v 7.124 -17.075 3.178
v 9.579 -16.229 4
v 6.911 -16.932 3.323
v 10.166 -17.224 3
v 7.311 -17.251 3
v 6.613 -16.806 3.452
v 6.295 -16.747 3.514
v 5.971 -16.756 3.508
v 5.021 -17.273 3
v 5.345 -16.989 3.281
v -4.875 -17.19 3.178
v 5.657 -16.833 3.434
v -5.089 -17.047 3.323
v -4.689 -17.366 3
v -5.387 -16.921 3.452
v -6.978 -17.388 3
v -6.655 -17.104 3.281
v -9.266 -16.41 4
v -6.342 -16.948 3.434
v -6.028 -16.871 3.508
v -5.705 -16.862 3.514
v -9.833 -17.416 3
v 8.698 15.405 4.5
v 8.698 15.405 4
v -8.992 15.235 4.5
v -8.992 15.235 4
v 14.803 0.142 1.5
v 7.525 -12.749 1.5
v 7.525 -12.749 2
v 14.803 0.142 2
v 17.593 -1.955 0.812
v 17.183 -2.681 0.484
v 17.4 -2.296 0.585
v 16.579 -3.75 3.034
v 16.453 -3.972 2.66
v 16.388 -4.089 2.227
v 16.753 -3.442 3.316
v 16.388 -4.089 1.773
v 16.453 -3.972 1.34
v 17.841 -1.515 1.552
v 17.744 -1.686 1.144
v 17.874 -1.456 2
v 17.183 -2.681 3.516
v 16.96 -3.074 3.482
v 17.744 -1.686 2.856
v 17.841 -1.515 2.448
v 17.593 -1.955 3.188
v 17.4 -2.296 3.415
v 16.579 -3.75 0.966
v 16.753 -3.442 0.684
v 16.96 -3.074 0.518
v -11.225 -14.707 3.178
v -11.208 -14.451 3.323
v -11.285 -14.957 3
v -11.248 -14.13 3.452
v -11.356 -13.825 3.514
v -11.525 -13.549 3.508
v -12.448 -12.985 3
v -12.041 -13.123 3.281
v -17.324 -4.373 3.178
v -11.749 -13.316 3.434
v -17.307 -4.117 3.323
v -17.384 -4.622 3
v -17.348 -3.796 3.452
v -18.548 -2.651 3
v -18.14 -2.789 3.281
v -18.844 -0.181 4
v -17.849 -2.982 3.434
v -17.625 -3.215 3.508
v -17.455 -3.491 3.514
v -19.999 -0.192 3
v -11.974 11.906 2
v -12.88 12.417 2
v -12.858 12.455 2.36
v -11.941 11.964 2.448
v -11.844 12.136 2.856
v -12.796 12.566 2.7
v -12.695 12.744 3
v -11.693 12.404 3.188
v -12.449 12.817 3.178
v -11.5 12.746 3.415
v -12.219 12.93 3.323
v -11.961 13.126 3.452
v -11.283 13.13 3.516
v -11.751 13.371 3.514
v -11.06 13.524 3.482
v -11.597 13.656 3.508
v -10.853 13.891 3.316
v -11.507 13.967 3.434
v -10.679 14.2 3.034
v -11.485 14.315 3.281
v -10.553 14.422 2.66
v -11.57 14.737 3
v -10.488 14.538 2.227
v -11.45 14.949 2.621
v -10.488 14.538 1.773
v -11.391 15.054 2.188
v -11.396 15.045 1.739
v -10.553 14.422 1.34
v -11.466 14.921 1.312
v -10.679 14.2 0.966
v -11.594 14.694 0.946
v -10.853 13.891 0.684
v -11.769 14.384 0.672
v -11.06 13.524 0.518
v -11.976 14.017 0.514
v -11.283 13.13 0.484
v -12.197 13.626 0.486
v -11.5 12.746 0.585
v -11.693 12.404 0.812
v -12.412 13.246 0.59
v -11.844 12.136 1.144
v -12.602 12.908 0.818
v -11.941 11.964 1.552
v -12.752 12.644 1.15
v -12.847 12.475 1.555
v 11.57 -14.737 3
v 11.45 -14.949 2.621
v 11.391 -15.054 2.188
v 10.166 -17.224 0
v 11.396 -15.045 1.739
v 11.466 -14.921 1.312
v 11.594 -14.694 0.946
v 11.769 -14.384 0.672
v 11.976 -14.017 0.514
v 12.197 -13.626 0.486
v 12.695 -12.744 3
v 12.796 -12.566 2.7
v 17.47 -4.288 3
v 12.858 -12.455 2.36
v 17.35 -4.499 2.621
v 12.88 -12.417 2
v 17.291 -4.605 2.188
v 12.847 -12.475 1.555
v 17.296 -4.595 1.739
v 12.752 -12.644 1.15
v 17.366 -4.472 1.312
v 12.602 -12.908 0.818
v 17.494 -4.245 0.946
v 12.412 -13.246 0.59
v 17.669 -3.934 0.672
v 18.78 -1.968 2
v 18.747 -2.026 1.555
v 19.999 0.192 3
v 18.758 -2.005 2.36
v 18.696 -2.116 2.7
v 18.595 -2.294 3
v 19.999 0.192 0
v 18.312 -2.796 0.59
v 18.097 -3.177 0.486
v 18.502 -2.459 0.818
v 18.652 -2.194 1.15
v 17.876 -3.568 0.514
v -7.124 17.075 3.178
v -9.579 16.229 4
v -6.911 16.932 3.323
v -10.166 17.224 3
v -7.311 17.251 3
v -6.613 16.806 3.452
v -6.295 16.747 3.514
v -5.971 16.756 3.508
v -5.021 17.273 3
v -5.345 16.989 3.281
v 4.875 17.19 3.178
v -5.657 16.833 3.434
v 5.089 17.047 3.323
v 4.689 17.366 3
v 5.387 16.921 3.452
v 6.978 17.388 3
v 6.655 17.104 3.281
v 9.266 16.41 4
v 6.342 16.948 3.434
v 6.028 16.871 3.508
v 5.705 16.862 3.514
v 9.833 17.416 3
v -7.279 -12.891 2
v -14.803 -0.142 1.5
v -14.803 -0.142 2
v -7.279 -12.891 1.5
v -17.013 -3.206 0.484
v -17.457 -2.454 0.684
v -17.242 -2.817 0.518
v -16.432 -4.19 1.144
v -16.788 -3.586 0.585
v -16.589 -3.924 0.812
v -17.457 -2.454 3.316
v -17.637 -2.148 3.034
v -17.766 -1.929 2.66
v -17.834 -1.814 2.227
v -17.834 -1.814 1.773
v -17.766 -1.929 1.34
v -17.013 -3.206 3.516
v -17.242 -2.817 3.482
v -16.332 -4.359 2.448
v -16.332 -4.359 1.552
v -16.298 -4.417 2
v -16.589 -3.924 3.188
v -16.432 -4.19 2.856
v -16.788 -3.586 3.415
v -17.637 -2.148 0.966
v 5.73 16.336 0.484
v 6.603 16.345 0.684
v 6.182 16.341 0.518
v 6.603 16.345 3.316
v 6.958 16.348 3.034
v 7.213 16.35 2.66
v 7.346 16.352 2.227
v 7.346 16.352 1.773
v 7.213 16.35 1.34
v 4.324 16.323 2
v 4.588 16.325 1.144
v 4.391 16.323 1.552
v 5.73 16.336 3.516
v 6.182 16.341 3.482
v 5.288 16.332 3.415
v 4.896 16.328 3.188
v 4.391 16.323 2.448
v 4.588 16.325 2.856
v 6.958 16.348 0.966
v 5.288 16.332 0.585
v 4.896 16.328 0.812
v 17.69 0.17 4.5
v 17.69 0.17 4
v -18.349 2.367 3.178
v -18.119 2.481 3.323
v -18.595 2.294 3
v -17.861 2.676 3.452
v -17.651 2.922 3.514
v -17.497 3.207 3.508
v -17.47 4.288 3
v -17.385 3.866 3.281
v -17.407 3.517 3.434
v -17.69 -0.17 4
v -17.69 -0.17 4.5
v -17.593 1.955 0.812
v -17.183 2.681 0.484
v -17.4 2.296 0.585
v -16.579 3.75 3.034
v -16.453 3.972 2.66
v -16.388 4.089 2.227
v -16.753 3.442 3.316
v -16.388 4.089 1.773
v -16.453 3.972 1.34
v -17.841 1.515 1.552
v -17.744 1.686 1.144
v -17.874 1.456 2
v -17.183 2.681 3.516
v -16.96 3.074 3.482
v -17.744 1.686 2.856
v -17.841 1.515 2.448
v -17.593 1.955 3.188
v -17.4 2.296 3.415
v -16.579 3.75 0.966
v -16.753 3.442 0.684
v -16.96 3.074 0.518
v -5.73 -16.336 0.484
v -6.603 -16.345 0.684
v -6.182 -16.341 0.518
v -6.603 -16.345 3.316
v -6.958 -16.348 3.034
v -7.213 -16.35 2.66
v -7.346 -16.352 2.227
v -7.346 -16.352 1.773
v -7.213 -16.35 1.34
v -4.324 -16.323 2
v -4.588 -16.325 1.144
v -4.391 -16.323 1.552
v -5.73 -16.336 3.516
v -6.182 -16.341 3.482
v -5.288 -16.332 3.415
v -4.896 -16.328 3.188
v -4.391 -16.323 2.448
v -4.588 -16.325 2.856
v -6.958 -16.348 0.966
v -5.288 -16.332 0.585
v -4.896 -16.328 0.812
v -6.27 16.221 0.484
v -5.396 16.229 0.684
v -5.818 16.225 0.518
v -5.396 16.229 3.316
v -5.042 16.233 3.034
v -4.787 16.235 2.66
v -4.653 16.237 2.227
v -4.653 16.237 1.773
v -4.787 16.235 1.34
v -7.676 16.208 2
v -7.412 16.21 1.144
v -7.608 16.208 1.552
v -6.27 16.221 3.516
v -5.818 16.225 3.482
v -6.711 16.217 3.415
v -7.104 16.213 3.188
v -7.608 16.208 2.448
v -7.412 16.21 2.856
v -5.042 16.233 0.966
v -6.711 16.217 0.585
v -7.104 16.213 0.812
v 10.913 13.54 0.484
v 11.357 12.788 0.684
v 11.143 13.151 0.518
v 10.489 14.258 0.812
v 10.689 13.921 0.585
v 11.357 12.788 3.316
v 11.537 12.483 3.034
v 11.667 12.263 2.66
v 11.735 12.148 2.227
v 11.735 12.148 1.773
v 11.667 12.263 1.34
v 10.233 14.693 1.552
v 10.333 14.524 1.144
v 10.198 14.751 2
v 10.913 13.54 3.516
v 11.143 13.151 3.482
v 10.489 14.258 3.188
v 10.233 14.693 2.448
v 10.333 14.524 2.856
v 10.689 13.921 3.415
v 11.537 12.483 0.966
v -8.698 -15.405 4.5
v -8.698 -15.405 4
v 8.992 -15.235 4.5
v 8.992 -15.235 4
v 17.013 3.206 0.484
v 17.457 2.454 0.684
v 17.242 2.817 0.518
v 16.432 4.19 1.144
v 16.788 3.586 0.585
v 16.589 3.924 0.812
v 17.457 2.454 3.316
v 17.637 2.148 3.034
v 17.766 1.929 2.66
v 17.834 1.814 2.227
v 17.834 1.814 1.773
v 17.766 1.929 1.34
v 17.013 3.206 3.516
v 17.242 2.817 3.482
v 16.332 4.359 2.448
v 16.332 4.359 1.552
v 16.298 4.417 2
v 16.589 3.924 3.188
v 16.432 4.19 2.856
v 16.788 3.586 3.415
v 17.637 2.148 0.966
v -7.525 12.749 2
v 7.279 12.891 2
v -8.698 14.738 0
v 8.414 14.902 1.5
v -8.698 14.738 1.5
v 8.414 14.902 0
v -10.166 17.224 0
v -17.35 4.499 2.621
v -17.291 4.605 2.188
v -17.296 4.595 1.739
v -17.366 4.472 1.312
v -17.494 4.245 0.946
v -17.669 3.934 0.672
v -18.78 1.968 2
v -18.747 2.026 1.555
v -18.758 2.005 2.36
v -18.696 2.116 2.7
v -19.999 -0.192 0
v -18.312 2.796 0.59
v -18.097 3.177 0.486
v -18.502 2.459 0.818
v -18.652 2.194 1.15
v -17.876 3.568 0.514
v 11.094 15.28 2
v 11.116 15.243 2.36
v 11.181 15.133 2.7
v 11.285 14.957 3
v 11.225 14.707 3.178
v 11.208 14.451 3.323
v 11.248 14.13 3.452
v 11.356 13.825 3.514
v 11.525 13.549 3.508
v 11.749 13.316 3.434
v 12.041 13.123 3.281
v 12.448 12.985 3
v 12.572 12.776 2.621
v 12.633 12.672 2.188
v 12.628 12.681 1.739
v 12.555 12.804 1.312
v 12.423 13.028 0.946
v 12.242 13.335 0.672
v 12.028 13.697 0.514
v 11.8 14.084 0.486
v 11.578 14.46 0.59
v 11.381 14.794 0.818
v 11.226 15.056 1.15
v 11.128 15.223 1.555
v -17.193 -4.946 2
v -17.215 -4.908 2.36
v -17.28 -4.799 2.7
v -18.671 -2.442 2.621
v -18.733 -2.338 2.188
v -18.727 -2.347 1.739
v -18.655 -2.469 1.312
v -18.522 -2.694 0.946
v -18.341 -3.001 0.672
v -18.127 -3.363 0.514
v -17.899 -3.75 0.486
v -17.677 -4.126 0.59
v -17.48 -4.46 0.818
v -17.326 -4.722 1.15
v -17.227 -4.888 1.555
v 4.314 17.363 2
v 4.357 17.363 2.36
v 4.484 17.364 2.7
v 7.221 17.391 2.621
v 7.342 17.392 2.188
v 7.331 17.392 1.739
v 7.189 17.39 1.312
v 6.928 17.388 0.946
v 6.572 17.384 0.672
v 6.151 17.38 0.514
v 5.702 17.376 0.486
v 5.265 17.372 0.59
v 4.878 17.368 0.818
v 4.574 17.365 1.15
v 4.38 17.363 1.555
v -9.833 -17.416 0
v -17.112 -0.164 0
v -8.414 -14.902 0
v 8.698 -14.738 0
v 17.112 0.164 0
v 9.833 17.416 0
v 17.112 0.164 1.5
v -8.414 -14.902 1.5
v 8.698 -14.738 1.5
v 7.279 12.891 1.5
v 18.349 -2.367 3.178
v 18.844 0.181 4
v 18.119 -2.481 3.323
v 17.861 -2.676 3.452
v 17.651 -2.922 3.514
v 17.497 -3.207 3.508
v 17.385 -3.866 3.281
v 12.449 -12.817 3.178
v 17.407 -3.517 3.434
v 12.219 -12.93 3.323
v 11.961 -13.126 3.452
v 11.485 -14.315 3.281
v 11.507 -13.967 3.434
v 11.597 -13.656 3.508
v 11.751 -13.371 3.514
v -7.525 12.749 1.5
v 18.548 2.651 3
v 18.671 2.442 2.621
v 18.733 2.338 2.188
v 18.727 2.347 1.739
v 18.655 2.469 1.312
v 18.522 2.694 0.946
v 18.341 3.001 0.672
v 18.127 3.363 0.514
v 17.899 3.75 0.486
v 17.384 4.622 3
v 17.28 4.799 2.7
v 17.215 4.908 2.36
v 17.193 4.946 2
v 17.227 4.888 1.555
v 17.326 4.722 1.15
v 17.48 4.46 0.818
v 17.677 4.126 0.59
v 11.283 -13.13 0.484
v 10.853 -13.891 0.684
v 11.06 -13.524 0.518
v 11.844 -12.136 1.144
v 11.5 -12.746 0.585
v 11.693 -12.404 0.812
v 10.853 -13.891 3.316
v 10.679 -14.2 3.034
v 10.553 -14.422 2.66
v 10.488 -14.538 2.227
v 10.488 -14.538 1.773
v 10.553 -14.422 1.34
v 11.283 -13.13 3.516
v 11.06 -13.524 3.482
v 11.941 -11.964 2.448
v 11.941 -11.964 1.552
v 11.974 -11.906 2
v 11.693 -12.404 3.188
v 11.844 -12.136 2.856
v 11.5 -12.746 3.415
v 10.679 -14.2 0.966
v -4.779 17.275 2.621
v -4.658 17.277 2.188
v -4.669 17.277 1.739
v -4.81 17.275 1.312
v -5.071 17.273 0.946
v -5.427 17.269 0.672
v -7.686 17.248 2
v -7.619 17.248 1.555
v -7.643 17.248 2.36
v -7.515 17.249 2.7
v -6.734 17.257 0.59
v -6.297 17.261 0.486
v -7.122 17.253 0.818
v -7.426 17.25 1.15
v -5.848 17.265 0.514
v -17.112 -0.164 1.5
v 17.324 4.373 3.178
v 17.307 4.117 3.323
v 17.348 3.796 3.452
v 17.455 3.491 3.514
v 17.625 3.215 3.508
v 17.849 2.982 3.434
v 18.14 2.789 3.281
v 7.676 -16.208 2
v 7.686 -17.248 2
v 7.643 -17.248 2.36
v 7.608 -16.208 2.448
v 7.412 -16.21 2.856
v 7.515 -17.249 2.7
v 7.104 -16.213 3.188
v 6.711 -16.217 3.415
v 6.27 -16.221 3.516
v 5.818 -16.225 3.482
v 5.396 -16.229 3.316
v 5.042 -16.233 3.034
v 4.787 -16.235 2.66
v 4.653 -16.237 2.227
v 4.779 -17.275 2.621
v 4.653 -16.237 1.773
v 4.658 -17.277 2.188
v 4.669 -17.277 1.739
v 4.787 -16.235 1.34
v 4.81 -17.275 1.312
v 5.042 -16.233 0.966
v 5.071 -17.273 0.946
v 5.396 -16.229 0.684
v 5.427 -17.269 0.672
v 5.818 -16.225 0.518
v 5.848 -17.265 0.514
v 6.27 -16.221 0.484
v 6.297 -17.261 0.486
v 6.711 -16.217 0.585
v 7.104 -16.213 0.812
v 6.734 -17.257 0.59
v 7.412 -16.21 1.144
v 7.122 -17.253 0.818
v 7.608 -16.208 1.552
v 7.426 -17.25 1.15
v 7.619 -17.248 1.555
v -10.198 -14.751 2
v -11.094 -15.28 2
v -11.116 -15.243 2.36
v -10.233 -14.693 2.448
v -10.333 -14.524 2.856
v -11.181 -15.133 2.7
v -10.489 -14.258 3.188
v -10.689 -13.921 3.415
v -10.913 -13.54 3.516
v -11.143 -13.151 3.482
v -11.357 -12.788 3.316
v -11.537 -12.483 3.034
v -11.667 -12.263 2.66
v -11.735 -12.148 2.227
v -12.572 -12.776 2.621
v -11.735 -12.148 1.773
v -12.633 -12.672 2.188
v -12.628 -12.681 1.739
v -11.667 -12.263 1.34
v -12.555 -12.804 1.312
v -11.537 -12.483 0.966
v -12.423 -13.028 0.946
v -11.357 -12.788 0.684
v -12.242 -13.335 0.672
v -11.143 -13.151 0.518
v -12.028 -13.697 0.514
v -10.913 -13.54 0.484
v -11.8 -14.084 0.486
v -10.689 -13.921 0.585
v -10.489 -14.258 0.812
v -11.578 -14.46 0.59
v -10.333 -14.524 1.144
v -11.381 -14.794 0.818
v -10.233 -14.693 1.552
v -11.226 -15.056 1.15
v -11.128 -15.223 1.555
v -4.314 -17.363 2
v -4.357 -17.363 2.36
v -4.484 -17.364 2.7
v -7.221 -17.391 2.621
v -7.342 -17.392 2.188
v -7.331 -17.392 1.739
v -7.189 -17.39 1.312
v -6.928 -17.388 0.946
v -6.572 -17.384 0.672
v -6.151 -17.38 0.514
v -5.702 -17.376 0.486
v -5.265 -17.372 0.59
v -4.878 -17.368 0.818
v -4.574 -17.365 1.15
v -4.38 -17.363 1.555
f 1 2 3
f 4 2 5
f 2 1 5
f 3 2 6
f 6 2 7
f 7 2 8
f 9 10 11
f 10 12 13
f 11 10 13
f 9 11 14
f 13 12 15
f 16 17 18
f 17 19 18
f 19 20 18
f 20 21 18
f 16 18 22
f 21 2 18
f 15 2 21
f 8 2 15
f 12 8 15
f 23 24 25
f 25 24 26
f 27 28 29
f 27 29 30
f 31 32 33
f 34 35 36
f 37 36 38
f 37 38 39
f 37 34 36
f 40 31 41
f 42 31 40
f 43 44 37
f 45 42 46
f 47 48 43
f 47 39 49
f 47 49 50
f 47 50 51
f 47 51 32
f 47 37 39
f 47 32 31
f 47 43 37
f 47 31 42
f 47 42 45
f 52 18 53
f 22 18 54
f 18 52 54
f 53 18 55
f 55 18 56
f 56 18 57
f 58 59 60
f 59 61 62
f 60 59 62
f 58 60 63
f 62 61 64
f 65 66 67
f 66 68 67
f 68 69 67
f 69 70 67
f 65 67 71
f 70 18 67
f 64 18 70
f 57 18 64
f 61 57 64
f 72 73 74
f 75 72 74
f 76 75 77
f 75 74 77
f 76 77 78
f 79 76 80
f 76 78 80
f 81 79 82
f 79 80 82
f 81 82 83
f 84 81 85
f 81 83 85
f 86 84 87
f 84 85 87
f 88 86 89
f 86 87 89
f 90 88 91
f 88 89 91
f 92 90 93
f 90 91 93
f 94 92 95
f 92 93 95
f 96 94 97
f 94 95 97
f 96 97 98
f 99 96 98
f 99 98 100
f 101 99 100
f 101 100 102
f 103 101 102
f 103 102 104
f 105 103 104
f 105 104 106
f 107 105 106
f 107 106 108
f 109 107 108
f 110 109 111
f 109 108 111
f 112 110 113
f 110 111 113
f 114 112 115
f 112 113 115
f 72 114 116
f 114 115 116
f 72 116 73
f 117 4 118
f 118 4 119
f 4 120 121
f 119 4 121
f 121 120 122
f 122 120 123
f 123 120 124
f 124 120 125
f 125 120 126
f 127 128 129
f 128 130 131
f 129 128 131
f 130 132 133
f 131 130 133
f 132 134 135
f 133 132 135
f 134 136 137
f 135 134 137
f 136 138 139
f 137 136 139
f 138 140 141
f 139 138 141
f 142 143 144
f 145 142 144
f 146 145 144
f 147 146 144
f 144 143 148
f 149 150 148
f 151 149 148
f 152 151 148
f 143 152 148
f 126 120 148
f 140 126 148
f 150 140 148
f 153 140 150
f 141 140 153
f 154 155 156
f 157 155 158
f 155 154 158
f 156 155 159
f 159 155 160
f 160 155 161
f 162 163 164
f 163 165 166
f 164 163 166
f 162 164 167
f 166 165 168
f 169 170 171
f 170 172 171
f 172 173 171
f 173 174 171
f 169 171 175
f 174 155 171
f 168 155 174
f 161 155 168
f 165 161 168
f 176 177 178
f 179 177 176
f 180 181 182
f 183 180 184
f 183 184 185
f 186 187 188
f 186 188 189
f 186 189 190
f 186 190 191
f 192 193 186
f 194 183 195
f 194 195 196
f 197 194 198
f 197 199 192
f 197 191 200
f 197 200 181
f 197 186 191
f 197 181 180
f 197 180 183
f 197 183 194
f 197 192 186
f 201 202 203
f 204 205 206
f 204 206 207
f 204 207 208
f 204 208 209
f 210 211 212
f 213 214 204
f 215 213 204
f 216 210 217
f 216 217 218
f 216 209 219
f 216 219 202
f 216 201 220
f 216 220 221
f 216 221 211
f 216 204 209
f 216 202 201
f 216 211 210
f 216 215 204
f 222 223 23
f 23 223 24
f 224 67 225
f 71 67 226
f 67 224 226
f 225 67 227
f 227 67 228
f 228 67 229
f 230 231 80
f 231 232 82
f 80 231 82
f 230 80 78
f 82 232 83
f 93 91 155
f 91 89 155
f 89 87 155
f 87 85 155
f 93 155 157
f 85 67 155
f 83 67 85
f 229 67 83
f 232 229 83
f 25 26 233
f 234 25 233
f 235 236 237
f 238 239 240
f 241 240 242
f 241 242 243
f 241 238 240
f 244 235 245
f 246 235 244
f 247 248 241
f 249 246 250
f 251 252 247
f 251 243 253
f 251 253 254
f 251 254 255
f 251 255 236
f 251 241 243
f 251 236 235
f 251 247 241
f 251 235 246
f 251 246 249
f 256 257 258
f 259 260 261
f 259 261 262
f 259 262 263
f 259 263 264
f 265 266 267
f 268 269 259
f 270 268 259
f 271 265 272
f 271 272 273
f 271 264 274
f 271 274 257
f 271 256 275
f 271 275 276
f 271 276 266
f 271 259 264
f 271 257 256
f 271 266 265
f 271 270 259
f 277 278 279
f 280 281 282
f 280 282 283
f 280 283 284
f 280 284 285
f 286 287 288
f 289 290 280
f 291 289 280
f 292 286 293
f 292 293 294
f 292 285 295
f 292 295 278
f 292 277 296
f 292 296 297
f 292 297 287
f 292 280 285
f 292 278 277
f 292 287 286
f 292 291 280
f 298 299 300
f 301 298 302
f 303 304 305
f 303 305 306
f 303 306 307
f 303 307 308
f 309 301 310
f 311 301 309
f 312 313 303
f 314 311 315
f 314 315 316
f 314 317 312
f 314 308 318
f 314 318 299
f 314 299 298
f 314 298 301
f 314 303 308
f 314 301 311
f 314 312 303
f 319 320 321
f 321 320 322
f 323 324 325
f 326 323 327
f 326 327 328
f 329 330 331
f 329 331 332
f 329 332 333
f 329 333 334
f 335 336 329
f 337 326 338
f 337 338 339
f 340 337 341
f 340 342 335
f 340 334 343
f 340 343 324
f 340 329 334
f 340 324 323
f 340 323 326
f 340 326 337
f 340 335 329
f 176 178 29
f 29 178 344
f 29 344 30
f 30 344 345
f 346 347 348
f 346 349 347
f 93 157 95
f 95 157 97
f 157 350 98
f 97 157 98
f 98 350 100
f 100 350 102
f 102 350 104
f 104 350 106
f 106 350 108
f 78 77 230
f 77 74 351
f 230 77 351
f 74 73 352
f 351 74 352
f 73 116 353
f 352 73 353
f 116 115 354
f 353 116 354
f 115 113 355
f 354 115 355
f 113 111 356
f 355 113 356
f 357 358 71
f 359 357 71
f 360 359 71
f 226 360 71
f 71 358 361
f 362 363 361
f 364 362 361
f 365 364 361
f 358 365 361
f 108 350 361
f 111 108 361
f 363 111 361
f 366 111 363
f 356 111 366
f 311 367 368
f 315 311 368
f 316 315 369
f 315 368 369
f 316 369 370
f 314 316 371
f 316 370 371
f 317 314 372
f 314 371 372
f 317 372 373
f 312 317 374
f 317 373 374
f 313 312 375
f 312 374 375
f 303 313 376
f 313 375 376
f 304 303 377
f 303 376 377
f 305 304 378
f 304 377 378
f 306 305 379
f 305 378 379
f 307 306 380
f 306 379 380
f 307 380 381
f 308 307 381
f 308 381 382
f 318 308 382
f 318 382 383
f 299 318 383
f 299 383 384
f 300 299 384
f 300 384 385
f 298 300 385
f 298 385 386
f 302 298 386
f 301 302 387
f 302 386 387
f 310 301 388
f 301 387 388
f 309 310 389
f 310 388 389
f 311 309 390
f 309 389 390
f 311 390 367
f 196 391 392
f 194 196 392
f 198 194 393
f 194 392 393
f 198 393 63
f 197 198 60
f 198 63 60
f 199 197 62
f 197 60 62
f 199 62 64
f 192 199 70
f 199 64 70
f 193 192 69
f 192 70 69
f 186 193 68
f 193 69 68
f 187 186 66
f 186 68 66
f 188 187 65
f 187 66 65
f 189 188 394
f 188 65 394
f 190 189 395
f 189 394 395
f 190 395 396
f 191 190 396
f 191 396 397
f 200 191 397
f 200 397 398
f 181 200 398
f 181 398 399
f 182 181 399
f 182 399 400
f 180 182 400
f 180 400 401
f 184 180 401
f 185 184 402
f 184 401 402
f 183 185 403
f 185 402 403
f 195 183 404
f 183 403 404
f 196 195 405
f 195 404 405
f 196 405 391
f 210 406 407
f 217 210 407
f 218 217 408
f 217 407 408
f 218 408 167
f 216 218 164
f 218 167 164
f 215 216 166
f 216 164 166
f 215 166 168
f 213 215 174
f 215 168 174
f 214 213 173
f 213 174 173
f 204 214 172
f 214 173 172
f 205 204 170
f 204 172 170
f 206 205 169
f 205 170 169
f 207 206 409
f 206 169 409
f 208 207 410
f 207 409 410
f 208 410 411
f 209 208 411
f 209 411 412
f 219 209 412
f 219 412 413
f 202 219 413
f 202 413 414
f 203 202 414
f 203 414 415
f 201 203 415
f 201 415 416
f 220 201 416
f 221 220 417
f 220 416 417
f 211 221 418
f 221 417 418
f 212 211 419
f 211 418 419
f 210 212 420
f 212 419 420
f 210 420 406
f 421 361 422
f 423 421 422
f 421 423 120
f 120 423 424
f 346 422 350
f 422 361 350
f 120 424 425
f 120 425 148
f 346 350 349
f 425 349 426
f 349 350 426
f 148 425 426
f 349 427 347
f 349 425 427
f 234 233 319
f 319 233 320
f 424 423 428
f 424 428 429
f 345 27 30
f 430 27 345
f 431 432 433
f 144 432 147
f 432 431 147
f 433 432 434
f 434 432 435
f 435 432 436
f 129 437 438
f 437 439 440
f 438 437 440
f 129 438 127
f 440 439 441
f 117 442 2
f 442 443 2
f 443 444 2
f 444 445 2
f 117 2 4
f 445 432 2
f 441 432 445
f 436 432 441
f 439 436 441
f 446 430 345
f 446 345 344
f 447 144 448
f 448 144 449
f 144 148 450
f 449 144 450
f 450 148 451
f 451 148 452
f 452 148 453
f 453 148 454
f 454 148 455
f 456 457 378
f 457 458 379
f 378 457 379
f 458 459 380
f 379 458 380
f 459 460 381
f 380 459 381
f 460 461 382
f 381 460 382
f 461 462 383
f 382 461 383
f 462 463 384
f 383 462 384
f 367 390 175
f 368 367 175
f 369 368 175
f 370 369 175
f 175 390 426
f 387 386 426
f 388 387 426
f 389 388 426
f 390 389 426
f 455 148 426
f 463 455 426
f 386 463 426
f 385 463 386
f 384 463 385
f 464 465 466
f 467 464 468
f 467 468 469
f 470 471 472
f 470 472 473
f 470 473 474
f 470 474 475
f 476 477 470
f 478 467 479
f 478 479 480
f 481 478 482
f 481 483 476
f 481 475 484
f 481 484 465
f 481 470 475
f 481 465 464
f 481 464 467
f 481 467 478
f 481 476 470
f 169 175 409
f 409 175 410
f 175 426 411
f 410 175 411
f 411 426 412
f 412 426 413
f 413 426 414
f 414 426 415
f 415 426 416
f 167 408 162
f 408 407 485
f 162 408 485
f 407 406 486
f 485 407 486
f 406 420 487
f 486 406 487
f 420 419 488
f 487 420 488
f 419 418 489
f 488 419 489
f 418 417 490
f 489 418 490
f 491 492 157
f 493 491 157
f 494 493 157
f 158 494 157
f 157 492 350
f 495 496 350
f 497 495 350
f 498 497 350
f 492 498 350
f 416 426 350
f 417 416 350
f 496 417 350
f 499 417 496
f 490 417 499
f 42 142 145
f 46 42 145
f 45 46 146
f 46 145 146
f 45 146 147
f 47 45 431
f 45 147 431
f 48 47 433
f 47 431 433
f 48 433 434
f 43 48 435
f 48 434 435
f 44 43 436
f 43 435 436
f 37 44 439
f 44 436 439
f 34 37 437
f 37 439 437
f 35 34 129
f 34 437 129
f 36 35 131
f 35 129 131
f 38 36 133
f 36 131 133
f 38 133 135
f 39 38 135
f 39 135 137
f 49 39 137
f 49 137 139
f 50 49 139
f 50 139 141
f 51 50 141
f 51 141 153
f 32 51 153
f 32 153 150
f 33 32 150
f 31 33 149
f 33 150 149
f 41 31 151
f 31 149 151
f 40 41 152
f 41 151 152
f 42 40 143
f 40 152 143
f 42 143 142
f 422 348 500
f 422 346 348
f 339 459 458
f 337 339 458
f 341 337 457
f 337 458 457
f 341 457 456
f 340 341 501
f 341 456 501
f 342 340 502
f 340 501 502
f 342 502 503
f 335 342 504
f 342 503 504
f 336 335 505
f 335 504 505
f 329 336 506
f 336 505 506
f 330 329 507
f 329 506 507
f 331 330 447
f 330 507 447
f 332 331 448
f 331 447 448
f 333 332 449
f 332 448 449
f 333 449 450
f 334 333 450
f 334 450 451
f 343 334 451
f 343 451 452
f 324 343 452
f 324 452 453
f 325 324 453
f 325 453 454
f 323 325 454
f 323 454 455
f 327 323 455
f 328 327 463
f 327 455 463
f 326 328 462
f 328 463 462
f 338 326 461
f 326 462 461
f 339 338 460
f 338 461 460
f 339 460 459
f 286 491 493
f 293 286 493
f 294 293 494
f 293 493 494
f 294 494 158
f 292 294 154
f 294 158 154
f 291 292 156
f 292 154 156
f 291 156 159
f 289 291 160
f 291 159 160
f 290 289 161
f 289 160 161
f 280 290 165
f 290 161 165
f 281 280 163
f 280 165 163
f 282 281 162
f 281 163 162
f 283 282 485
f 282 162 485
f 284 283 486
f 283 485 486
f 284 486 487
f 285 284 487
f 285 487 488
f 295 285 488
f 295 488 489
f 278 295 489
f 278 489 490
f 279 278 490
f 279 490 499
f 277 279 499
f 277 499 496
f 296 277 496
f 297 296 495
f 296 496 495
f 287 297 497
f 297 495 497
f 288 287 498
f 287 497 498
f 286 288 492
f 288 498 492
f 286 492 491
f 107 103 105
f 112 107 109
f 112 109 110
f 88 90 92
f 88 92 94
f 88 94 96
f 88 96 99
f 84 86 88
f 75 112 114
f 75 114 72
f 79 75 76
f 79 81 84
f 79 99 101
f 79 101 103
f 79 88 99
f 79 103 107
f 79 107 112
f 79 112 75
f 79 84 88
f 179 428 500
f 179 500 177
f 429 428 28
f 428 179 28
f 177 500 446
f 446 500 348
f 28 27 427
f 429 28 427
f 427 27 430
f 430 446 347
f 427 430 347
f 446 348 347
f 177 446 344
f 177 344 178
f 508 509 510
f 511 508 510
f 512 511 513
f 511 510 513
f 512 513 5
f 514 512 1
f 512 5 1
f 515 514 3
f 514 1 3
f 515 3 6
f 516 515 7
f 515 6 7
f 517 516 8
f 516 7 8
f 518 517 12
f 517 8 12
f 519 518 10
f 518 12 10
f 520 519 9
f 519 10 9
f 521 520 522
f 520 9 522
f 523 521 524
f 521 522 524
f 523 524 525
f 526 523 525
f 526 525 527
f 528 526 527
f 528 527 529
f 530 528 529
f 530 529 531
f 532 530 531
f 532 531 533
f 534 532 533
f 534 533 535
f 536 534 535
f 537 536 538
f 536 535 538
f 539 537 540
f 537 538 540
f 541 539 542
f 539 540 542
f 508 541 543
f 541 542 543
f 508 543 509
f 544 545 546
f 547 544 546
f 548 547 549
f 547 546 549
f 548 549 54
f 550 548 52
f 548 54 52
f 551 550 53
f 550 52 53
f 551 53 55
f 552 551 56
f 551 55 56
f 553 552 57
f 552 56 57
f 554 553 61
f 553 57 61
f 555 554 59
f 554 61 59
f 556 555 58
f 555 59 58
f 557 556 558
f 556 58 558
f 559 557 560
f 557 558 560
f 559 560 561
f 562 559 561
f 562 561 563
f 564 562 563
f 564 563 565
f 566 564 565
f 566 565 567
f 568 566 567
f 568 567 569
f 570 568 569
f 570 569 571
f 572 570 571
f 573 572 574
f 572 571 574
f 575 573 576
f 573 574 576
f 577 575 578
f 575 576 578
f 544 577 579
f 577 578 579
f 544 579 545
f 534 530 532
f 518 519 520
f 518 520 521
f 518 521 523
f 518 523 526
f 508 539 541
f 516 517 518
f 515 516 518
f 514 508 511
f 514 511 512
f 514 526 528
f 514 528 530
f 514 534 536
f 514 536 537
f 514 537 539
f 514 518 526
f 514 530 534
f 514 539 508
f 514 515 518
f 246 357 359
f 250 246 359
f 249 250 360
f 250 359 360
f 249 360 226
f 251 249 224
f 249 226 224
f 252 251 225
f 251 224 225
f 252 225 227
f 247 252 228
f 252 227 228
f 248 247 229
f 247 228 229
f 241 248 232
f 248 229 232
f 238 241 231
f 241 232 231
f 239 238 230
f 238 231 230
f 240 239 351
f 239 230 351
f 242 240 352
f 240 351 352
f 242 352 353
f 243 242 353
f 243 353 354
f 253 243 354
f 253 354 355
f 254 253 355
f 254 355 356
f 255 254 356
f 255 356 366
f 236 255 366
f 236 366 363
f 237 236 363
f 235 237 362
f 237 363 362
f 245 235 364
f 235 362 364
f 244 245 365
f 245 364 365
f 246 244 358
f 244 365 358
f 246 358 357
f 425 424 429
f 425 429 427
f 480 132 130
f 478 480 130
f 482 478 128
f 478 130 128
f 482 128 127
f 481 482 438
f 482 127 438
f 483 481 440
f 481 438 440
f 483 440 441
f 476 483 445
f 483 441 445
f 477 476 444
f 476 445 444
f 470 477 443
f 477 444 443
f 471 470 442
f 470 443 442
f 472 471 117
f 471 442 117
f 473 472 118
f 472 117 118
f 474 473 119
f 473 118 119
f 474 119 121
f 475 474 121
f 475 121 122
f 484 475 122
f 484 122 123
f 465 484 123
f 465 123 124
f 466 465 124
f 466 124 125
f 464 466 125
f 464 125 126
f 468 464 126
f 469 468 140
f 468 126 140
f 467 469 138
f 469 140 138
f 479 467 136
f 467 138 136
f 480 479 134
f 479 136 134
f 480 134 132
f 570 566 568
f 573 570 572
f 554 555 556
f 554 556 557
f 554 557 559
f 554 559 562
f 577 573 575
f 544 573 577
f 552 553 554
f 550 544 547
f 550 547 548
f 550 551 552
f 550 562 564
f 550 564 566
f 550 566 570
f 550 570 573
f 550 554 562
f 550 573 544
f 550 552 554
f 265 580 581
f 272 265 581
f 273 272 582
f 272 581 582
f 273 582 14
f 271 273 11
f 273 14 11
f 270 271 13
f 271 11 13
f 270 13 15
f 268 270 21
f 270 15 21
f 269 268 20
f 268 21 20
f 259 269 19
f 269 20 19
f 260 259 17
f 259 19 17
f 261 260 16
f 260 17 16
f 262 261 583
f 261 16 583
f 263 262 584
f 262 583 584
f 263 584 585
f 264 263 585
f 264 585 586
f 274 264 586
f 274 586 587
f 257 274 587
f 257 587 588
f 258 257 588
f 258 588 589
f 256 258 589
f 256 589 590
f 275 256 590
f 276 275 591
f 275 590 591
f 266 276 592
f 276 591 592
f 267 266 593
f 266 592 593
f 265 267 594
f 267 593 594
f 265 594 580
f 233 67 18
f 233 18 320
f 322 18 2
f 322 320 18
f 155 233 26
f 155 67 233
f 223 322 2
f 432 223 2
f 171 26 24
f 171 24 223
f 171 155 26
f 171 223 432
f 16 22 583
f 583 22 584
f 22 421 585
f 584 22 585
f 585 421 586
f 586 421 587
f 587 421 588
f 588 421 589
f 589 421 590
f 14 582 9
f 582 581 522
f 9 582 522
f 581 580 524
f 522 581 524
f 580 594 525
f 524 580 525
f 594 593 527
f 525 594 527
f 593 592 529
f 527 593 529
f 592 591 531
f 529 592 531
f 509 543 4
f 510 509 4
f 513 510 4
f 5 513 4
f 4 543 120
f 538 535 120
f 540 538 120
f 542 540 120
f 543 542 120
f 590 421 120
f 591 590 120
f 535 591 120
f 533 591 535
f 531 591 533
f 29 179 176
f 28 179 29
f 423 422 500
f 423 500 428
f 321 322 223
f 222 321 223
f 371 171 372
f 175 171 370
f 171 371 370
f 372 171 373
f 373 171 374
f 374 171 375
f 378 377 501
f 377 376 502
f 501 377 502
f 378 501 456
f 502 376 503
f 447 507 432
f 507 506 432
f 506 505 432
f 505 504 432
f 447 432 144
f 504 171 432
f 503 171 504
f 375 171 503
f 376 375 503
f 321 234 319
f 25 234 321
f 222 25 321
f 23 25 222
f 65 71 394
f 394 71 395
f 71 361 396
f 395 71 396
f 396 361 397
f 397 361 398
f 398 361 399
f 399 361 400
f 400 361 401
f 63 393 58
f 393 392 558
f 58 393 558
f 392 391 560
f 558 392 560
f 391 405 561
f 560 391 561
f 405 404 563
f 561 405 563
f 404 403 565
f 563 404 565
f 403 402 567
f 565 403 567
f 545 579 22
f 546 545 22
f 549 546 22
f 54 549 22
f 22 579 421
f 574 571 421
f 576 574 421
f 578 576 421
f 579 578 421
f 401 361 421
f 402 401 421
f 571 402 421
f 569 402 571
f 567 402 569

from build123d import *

# Parameters (mm, degrees)
F1_DEPTH      = 4.5
F2_DEPTH      = 4
F3_T          = -2.5
F4_R          = 1.52
F5_DEPTH      = 1.04
F6_R          = 1.52
F7_DEPTH      = 1.04
F8_R          = 1.52
F9_DEPTH      = 1.04
F10_R         = 1.52
F11_DEPTH     = 1.04
F12_R         = 1.52
F13_DEPTH     = 1.04
F14_R         = 1.52
F15_DEPTH     = 1.04
F16_T1_DEPTH  = 25.1433659759
F16_T3_DEPTH  = 25.1433659759
F16_T5_DEPTH  = 25.1433659759
F16_T7_DEPTH  = 25.1433659759
F16_T9_DEPTH  = 25.1433659759
F16_T11_DEPTH = 25.1433659759


# Not quite as in the source:
# - a fillet or chamfer that OpenCascade refuses, or shapes differently, is made with other operations: its cross-section is extruded or revolved along the edge and cut away or added


with BuildPart() as f1:
    # F0 (on Top) → F1 (new body)
    with BuildSketch(Plane.XY):
        Polygon((-8.9919036831, 15.2349256124), (-17.6897844467, -0.1697542118), (-8.6978807636, -15.4046798242), (8.9919036831, -15.2349256124), (17.6897844467, 0.1697542118), (8.6978807636, 15.4046798242), align=None)
    extrude(amount=F1_DEPTH)

    # F0 (on Top) → F2 (join)
    with BuildSketch(Plane.XY):
        Polygon((-19.9990791985, -0.1919146011), (-9.8333366793, -17.4156679387), (10.1657425191, -17.2237533376), (19.9990791985, 0.1919146011), (9.8333366793, 17.4156679387), (-10.1657425191, 17.2237533376), align=None)
        Polygon((-8.6978807636, -15.4046798242), (-17.6897844467, -0.1697542118), (-8.9919036831, 15.2349256124), (8.6978807636, 15.4046798242), (17.6897844467, 0.1697542118), (8.9919036831, -15.2349256124), align=None, mode=Mode.SUBTRACT)
    extrude(amount=F2_DEPTH)

    # F3
    f3_openings = [f1.faces().sort_by_distance(p)[0] for p in [
        (0, 0, 0),
    ]]
    offset(amount=F3_T, openings=f3_openings, kind=Kind.INTERSECTION)

    # F4 (on face) → F5 (cut)
    with BuildSketch(Plane(origin=(15.0824108588, -8.5159193683, 0), x_dir=(0.491666834, 0.8707833969, 0), z_dir=(0.8707833969, -0.491666834, 0))):
        with Locations((-6, 2)):
            Circle(F4_R)
        with Locations((6, 2)):
            Circle(F4_R)
    extrude(amount=-F5_DEPTH, mode=Mode.SUBTRACT)

    # F6 (on face) → F7 (cut)
    with BuildSketch(Plane(origin=(0.1662029199, -17.3197106382, 0), x_dir=(0.9999539599, 0.0095957301, 0), z_dir=(0.0095957301, -0.9999539599, 0))):
        with Locations((-6, 2)):
            Circle(F6_R)
        with Locations((6, 2)):
            Circle(F6_R)
    extrude(amount=-F7_DEPTH, mode=Mode.SUBTRACT)

    # F8 (on face) → F9 (cut)
    with BuildSketch(Plane(origin=(-14.9162079389, -8.8037912699, 0), x_dir=(0.508287126, -0.8611876669, 0), z_dir=(-0.8611876669, -0.508287126, 0))):
        with Locations((-6, 2)):
            Circle(F8_R)
        with Locations((6, 2)):
            Circle(F8_R)
    extrude(amount=-F9_DEPTH, mode=Mode.SUBTRACT)

    # F10 (on face) → F11 (cut)
    with BuildSketch(Plane(origin=(-15.0824108588, 8.5159193683, 0), x_dir=(-0.491666834, -0.8707833969, 0), z_dir=(-0.8707833969, 0.491666834, 0))):
        with Locations((-6, 2)):
            Circle(F10_R)
        with Locations((6, 2)):
            Circle(F10_R)
    extrude(amount=-F11_DEPTH, mode=Mode.SUBTRACT)

    # F12 (on face) → F13 (cut)
    with BuildSketch(Plane(origin=(-0.1662029199, 17.3197106382, 0), x_dir=(-0.9999539599, -0.0095957301, 0), z_dir=(-0.0095957301, 0.9999539599, 0))):
        with Locations((-6, 2)):
            Circle(F12_R)
        with Locations((6, 2)):
            Circle(F12_R)
    extrude(amount=-F13_DEPTH, mode=Mode.SUBTRACT)

    # F14 (on face) → F15 (cut)
    with BuildSketch(Plane(origin=(14.9162079389, 8.8037912699, 0), x_dir=(-0.508287126, 0.8611876669, 0), z_dir=(0.8611876669, 0.508287126, 0))):
        with Locations((-6, 2)):
            Circle(F14_R)
        with Locations((6, 2)):
            Circle(F14_R)
    extrude(amount=-F15_DEPTH, mode=Mode.SUBTRACT)

    # F16: chamfer of 1 on 6 edges, made by hand

    # F16_s2 → F16_t1 (cut)
    with BuildSketch(Plane(origin=(6.3900246144, -10.8265783412, 0), x_dir=(0, 0, 1), z_dir=(-0.508287126, 0.8611876669, 0))):
        Polygon((4, 16.3205080757), (3, 17.3205080757), (4, 17.3205080757), align=None)
    extrude(amount=F16_T1_DEPTH, mode=Mode.SUBTRACT)

    # F16_s4 → F16_t3 (cut)
    with BuildSketch(Plane(origin=(-6.1810795723, -10.9472128174, 0), x_dir=(0, 0, 1), z_dir=(0.491666834, 0.8707833969, 0))):
        Polygon((4, 16.3205080757), (3, 17.3205080757), (4, 17.3205080757), align=None)
    extrude(amount=F16_T3_DEPTH, mode=Mode.SUBTRACT)

    # F16_s6 → F16_t5 (cut)
    with BuildSketch(Plane(origin=(-12.5711041867, -0.1206344763, 0), x_dir=(0, 0, 1), z_dir=(0.9999539599, 0.0095957301, 0))):
        Polygon((4, 16.3205080757), (3, 17.3205080757), (4, 17.3205080757), align=None)
    extrude(amount=F16_T5_DEPTH, mode=Mode.SUBTRACT)

    # F16_s8 → F16_t7 (cut)
    with BuildSketch(Plane(origin=(-6.3900246144, 10.8265783412, 0), x_dir=(0, 0, 1), z_dir=(0.508287126, -0.8611876669, 0))):
        Polygon((4, 16.3205080757), (3, 17.3205080757), (4, 17.3205080757), align=None)
    extrude(amount=F16_T7_DEPTH, mode=Mode.SUBTRACT)

    # F16_s10 → F16_t9 (cut)
    with BuildSketch(Plane(origin=(6.1810795723, 10.9472128174, 0), x_dir=(0, 0, 1), z_dir=(-0.491666834, -0.8707833969, 0))):
        Polygon((4, 16.3205080757), (3, 17.3205080757), (4, 17.3205080757), align=None)
    extrude(amount=F16_T9_DEPTH, mode=Mode.SUBTRACT)

    # F16_s12 → F16_t11 (cut)
    with BuildSketch(Plane(origin=(12.5711041867, 0.1206344763, 0), x_dir=(0, 0, 1), z_dir=(-0.9999539599, -0.0095957301, 0))):
        Polygon((4, 16.3205080757), (3, 17.3205080757), (4, 17.3205080757), align=None)
    extrude(amount=F16_T11_DEPTH, mode=Mode.SUBTRACT)


solid = f1.part
